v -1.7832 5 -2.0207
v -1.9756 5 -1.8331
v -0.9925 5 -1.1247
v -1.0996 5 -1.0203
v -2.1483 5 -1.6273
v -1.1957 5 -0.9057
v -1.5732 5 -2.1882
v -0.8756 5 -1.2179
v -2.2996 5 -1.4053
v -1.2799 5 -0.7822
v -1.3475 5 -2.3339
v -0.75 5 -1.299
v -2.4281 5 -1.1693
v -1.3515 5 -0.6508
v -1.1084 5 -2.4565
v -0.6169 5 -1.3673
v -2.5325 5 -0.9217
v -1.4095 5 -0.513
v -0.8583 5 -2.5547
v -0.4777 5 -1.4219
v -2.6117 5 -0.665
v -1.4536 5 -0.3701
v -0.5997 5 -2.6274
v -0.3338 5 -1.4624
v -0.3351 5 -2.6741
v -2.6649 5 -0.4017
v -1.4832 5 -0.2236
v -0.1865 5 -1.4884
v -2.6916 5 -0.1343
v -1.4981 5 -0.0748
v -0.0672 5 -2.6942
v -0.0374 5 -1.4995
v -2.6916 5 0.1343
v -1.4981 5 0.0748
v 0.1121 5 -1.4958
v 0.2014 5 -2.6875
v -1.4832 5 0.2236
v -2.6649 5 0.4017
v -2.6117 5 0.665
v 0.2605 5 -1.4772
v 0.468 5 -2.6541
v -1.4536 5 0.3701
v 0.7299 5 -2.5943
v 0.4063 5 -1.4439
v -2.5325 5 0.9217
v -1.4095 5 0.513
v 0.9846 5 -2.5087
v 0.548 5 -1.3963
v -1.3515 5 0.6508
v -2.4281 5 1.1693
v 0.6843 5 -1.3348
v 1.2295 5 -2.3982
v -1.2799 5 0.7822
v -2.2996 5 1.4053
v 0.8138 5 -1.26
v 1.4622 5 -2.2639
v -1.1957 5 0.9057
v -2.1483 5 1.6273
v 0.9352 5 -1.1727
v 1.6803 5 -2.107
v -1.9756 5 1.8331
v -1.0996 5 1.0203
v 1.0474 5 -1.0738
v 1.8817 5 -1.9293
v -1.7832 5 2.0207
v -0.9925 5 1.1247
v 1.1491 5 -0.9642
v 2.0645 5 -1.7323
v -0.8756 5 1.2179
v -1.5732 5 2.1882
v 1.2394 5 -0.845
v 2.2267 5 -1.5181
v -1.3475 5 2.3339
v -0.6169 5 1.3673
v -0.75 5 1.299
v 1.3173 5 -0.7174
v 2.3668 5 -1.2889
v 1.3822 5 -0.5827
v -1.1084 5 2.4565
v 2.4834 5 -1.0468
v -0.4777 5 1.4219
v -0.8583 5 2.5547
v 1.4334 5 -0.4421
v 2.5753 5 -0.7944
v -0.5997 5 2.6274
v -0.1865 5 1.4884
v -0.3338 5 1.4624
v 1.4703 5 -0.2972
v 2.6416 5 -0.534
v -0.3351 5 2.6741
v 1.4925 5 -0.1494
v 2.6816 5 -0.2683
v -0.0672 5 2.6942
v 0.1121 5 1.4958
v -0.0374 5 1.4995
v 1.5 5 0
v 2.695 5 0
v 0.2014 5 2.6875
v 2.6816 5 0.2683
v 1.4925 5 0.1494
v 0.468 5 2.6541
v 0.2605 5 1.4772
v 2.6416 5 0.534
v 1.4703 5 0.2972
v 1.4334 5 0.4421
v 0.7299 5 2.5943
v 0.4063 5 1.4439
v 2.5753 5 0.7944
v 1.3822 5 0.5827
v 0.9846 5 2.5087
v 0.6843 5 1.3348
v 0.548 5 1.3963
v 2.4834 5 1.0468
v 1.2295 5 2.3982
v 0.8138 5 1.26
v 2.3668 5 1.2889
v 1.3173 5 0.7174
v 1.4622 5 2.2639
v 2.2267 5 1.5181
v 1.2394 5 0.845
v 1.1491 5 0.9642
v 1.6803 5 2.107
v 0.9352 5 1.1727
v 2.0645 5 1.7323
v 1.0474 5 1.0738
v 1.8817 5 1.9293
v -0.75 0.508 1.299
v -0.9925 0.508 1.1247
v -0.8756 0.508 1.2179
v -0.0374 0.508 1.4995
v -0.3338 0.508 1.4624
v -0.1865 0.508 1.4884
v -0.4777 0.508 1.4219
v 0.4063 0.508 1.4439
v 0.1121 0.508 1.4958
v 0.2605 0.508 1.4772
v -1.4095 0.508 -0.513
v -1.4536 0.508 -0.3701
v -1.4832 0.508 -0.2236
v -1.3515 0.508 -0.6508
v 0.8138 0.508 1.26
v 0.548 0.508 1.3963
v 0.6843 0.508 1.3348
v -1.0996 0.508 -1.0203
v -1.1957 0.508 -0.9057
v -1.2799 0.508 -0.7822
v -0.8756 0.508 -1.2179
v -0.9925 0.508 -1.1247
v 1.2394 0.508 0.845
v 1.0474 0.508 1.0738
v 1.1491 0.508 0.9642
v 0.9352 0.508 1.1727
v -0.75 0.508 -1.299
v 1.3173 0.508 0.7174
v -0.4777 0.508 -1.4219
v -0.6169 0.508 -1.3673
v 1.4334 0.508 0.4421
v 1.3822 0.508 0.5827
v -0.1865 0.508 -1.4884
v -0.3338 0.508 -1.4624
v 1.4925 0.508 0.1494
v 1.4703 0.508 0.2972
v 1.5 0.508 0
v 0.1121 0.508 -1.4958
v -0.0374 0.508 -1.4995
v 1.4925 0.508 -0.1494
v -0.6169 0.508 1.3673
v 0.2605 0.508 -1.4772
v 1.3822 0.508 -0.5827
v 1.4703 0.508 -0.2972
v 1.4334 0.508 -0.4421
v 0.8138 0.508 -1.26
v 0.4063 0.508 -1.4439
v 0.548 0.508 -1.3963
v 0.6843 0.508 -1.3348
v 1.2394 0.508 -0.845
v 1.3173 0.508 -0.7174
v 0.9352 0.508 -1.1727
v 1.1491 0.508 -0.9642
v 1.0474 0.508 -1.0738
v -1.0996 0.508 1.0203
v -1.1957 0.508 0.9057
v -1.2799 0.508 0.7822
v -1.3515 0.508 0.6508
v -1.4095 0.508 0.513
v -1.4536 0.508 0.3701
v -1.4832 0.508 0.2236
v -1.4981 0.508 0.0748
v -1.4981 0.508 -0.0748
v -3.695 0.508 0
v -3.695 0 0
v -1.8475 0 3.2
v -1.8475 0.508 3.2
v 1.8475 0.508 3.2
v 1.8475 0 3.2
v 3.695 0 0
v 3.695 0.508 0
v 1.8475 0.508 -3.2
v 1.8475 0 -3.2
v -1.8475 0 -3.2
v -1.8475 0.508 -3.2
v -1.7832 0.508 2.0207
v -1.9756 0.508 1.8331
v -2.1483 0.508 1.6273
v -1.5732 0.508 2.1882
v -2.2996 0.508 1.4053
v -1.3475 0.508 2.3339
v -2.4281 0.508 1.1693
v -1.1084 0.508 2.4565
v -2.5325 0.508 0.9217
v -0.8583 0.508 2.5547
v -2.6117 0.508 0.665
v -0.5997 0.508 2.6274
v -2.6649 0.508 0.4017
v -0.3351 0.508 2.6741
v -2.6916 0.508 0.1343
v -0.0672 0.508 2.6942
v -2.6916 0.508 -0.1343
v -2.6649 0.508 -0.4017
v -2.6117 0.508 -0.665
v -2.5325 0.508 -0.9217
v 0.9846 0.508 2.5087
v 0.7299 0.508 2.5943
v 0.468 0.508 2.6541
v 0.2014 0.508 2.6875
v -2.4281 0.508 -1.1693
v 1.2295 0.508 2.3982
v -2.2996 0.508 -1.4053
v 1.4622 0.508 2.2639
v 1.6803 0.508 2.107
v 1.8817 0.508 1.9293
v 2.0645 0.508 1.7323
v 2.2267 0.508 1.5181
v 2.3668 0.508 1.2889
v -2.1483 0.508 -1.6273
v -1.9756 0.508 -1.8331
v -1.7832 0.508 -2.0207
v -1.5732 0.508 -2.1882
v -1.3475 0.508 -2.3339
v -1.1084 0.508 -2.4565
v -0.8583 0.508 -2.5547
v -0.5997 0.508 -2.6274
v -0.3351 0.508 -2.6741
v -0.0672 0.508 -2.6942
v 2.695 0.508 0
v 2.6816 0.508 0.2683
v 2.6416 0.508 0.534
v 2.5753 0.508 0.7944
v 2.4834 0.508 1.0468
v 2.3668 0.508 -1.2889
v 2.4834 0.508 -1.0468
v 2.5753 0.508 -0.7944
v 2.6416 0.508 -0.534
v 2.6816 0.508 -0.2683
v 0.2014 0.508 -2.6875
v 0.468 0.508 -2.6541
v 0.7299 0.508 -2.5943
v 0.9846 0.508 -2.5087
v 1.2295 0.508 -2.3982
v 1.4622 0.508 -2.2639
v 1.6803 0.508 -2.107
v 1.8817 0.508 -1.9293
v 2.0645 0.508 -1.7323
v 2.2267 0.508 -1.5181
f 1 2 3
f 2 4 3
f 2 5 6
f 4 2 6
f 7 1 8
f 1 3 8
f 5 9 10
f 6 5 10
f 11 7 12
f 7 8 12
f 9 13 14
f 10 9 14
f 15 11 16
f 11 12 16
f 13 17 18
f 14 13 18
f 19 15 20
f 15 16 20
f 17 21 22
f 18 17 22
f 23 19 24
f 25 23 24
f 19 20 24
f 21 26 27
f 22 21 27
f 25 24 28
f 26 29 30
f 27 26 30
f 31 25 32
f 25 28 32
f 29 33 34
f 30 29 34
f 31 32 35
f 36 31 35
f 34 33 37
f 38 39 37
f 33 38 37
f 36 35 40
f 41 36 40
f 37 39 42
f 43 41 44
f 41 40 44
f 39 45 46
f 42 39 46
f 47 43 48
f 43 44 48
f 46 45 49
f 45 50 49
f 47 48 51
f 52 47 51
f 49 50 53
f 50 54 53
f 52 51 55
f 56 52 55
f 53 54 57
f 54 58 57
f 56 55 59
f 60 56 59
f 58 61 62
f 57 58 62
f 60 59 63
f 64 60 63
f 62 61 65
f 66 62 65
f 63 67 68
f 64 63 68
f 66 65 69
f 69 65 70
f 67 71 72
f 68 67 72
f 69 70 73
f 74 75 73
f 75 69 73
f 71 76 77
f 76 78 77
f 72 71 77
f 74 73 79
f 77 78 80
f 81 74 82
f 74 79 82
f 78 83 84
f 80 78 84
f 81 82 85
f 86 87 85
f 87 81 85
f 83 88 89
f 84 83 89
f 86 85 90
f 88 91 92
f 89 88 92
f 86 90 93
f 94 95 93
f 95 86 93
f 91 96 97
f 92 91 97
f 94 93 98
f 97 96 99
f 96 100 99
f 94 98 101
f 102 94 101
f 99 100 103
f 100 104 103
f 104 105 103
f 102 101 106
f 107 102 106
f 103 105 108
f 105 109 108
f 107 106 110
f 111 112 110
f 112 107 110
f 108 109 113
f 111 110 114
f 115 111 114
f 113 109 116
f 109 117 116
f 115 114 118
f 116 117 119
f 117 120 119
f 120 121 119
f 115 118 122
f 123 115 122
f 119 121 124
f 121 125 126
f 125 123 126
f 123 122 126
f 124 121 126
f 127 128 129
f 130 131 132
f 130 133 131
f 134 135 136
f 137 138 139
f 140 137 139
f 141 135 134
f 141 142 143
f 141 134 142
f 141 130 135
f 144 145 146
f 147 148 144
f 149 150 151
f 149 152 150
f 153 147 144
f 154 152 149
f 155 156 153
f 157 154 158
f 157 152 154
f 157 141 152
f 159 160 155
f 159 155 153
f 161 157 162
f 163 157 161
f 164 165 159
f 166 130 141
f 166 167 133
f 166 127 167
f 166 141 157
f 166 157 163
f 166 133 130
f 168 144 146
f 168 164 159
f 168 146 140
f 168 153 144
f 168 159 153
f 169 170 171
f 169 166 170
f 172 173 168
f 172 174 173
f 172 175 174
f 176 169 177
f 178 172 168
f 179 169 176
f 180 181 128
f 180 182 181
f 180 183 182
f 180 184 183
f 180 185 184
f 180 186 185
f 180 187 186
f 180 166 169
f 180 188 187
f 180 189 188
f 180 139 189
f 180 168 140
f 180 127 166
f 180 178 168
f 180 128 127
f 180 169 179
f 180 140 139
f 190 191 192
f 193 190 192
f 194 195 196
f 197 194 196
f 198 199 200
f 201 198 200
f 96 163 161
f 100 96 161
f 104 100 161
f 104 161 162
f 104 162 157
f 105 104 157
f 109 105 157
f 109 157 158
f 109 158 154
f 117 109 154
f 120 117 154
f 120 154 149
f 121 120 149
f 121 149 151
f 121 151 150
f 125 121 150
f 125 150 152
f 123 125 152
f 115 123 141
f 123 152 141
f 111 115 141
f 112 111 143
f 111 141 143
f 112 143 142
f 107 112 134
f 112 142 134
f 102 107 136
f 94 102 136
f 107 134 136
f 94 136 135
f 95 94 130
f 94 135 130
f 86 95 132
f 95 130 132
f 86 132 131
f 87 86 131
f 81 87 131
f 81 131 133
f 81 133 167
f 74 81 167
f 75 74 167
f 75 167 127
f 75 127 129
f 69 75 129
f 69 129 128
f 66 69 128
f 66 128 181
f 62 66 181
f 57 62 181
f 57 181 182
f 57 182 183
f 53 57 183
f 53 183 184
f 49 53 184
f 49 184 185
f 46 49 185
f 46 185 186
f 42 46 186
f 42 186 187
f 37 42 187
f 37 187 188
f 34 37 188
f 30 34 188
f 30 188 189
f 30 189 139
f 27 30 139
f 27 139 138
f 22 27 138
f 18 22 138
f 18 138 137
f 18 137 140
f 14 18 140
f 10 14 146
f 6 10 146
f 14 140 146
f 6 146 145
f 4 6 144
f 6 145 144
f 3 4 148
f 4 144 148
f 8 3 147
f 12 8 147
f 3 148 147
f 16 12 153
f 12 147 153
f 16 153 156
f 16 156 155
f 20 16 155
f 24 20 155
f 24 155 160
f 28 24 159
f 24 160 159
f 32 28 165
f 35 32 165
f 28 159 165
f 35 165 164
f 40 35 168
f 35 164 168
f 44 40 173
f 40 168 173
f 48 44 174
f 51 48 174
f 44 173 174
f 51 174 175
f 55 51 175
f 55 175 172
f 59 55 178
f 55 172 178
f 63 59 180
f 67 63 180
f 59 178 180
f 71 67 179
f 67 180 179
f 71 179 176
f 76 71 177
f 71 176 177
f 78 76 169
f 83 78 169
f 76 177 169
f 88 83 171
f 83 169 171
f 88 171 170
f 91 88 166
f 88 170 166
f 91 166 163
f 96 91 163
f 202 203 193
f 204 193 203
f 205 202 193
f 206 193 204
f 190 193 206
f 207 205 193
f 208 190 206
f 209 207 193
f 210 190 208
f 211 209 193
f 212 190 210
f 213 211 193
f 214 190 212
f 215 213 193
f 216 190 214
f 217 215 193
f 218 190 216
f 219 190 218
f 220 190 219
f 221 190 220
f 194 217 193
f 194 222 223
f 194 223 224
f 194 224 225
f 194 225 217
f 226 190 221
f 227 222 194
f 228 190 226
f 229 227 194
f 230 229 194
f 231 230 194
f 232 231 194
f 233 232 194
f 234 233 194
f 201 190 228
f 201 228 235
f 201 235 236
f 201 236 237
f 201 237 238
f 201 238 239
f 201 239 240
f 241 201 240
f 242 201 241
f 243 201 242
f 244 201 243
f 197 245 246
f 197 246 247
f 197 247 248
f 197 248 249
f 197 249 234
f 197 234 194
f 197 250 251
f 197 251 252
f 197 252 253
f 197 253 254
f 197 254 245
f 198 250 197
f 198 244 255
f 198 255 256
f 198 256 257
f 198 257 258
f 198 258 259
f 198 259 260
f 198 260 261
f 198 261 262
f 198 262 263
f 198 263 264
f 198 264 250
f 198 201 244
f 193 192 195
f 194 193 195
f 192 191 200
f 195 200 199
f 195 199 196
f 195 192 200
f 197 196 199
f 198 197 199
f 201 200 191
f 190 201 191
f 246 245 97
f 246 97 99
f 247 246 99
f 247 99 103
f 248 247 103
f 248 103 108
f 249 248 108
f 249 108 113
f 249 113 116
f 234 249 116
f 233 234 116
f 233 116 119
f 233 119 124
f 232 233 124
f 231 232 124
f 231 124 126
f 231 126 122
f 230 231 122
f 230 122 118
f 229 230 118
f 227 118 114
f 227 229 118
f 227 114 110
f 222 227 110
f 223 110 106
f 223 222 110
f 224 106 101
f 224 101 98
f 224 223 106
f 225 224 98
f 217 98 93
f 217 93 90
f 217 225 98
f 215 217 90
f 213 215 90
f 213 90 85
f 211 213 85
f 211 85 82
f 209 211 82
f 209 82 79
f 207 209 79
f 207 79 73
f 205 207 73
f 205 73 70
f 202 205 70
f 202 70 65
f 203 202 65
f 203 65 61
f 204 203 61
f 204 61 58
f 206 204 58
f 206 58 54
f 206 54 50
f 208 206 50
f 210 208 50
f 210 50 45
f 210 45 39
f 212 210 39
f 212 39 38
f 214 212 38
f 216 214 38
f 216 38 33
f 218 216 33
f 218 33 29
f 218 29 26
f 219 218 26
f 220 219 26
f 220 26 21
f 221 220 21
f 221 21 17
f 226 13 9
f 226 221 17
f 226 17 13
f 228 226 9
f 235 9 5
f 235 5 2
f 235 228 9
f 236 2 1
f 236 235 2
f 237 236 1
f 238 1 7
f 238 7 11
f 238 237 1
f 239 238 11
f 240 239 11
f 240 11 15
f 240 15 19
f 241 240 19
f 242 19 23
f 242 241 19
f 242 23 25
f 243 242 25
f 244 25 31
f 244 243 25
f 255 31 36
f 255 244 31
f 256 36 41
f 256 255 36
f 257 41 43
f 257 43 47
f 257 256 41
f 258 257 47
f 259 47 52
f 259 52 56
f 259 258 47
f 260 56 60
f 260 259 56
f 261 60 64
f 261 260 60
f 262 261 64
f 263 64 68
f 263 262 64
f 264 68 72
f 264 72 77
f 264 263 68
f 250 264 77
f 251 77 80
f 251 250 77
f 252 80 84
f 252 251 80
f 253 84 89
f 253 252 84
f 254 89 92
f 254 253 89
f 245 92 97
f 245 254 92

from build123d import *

# Parameters (mm, degrees)
BOSS_EXTRUDE1_DEPTH = 0.508
SKETCH2_R           = 2.695
SKETCH2_R_2         = 1.5
BOSS_EXTRUDE2_DEPTH = 5


with BuildPart() as part:
    # Sketch1 → Boss-Extrude1 (new body)
    with BuildSketch(Plane(origin=(0, 0, 0), x_dir=(1, 0, 0), z_dir=(0, 1, 0))):
        Polygon((1.847520861, -3.2), (3.695041723, 0), (1.847520861, 3.2), (-1.847520861, 3.2), (-3.695041723, 0), (-1.847520861, -3.2), align=None)
    extrude(amount=BOSS_EXTRUDE1_DEPTH)

    # Sketch2 → Boss-Extrude2 (add)
    with BuildSketch(Plane.XZ):
        Circle(SKETCH2_R)
        Circle(SKETCH2_R_2, mode=Mode.SUBTRACT)
    extrude(amount=-BOSS_EXTRUDE2_DEPTH)


solid = part.part
